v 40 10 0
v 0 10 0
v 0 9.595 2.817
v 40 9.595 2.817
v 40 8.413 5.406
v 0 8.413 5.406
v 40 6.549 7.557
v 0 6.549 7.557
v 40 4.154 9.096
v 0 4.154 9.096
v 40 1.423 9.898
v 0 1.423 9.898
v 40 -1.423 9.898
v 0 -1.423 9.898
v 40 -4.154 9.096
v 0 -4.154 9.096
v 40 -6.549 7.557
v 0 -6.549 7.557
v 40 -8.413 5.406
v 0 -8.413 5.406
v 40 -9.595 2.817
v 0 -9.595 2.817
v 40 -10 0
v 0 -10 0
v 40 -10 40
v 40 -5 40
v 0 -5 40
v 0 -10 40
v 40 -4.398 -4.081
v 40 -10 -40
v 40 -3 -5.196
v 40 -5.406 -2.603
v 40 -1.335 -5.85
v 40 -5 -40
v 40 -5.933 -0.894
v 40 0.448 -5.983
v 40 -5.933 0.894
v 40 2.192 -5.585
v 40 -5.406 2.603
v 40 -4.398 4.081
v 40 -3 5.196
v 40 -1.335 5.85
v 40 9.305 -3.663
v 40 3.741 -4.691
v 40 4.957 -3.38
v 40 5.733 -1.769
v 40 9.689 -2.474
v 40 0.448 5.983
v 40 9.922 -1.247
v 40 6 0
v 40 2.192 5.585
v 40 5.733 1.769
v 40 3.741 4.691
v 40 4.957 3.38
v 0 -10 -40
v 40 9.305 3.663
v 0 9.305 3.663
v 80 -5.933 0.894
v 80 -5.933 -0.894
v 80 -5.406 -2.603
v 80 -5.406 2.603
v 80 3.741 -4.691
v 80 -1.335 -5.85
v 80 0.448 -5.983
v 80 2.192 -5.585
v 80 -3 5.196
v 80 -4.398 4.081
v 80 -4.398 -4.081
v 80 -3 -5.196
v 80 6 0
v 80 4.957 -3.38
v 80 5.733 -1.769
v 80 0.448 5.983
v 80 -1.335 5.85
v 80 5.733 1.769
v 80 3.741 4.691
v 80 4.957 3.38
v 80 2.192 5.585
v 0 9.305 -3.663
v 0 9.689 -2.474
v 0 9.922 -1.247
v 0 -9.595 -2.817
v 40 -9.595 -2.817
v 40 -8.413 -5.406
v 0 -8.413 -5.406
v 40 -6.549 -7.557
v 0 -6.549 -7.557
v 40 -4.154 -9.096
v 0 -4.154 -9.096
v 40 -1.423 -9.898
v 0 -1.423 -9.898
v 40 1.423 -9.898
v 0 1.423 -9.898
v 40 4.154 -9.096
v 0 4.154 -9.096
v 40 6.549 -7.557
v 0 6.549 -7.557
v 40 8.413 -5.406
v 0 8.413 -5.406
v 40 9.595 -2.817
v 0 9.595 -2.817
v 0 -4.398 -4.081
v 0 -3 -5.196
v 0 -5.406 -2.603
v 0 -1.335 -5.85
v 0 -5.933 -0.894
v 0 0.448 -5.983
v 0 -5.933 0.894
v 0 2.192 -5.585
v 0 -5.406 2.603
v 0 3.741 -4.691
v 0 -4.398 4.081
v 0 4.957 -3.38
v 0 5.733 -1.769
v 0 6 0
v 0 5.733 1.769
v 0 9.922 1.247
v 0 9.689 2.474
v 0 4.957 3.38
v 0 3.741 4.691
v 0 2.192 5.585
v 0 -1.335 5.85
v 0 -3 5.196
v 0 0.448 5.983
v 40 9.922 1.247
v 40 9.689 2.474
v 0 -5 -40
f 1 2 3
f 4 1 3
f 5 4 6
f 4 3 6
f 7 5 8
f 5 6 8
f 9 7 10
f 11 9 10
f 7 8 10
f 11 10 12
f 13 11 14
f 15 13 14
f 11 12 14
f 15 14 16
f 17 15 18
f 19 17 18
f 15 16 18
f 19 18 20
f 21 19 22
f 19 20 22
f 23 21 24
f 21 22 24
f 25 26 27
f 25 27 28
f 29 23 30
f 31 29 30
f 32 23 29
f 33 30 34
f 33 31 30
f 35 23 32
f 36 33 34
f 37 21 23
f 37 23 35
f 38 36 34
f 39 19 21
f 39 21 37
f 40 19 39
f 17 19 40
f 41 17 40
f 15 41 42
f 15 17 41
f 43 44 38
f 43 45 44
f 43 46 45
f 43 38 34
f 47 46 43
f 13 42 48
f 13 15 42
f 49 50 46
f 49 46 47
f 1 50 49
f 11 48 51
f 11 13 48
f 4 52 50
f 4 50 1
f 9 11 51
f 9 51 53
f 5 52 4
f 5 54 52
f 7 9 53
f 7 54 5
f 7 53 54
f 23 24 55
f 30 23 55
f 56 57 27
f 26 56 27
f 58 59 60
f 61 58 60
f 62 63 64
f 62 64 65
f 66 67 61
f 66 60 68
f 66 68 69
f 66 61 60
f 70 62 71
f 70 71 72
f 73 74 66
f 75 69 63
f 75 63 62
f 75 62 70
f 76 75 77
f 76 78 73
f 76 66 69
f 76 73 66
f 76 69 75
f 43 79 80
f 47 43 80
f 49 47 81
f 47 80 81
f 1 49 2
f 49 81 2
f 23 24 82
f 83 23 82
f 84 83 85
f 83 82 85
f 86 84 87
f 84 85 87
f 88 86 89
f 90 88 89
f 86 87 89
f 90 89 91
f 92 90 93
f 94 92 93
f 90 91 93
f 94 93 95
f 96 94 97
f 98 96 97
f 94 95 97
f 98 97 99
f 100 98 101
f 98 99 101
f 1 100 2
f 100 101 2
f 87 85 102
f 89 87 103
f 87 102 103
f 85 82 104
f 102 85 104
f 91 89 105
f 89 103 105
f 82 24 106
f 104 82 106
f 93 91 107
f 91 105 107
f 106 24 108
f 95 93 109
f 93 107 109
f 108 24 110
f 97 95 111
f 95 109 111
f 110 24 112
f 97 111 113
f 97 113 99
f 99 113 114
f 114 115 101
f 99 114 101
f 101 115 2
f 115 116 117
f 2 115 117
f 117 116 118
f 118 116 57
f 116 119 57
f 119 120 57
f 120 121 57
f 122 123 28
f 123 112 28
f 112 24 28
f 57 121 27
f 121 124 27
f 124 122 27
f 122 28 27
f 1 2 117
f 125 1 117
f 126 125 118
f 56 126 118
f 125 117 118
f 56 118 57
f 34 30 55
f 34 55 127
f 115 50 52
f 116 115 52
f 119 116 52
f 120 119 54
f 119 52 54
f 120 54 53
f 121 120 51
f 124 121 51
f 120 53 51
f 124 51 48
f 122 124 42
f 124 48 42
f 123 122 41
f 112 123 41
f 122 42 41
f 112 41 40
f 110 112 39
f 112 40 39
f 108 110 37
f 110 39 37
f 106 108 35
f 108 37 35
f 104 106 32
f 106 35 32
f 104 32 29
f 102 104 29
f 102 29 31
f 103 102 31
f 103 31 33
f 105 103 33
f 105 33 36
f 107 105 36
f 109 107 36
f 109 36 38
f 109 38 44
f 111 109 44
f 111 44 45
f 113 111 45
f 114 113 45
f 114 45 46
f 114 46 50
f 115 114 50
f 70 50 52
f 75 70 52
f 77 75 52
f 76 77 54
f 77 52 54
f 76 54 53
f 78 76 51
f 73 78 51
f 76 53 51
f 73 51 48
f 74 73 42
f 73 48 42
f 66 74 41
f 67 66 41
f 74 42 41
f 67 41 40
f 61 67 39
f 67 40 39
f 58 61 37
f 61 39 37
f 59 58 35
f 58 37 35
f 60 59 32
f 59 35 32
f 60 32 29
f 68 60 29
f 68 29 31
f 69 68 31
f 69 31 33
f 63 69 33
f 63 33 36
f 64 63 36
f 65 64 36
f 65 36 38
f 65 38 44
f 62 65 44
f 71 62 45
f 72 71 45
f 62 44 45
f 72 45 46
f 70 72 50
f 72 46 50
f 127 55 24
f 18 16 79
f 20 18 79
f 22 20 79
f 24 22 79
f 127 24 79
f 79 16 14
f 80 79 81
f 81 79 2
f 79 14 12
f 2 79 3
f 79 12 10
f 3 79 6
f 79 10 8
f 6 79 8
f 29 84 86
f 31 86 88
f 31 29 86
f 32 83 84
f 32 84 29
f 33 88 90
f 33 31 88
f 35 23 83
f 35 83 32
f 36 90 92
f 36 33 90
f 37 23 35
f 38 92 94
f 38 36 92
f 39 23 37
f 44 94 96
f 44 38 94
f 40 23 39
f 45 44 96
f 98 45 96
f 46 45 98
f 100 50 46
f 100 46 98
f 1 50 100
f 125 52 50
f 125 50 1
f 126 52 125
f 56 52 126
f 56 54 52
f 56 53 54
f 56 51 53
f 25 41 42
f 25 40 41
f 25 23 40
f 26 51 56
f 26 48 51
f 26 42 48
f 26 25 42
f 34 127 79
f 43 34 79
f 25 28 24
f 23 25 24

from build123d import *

# Parameters (mm, degrees)
F1_DEPTH = 40
F2_R     = 6
F3_DEPTH = 40.001
F5_DEPTH = 40
F6_R     = 6
F7_DEPTH = 40


with BuildPart() as f1:
    # F0 (on Right) → F1 (new body)
    with BuildSketch(Plane.YZ):
        with BuildLine():
            ThreePointArc((-10, 0), (0, -10), (10, 0))
            ThreePointArc((10, 0), (9.8246940609, 1.8642388822), (9.304922678, 3.6631153348))
            ThreePointArc((9.304922678, 3.6631153348), (-1.8642388822, 9.8246940609), (-10, 0))
        make_face()
        with BuildLine():
            ThreePointArc((-10, 0), (-1.8642388822, 9.8246940609), (9.304922678, 3.6631153348))
            Line((9.304922678, 3.6631153348), (-5, 40))
            Line((-5, 40), (-10, 40))
            Line((-10, 40), (-10, 0))
        make_face()
    extrude(amount=F1_DEPTH)

    # F2 (on face) → F3 (cut, through all)
    with BuildSketch(Plane.YZ.offset(40)):
        Circle(F2_R)
    extrude(amount=-F3_DEPTH, mode=Mode.SUBTRACT)


with BuildPart() as f5:
    # F4 (on Right) → F5 (new body)
    with BuildSketch(Plane.YZ):
        with BuildLine():
            ThreePointArc((9.304922678, -3.6631153348), (9.8246940609, -1.8642388822), (10, 0))
            ThreePointArc((10, 0), (0, 10), (-10, 0))
            ThreePointArc((-10, 0), (-1.8642388822, -9.8246940609), (9.304922678, -3.6631153348))
        make_face()
        with BuildLine():
            ThreePointArc((9.304922678, -3.6631153348), (-1.8642388822, -9.8246940609), (-10, 0))
            Line((-10, 0), (-10, -40))
            Line((-10, -40), (-5, -40))
            Line((-5, -40), (9.304922678, -3.6631153348))
        make_face()
    extrude(amount=F5_DEPTH)

    # F6 (on face) → F7 (join)
    with BuildSketch(Plane.YZ.offset(40)):
        Circle(F6_R)
    extrude(amount=F7_DEPTH)


solid = Compound([f1.part, f5.part])
